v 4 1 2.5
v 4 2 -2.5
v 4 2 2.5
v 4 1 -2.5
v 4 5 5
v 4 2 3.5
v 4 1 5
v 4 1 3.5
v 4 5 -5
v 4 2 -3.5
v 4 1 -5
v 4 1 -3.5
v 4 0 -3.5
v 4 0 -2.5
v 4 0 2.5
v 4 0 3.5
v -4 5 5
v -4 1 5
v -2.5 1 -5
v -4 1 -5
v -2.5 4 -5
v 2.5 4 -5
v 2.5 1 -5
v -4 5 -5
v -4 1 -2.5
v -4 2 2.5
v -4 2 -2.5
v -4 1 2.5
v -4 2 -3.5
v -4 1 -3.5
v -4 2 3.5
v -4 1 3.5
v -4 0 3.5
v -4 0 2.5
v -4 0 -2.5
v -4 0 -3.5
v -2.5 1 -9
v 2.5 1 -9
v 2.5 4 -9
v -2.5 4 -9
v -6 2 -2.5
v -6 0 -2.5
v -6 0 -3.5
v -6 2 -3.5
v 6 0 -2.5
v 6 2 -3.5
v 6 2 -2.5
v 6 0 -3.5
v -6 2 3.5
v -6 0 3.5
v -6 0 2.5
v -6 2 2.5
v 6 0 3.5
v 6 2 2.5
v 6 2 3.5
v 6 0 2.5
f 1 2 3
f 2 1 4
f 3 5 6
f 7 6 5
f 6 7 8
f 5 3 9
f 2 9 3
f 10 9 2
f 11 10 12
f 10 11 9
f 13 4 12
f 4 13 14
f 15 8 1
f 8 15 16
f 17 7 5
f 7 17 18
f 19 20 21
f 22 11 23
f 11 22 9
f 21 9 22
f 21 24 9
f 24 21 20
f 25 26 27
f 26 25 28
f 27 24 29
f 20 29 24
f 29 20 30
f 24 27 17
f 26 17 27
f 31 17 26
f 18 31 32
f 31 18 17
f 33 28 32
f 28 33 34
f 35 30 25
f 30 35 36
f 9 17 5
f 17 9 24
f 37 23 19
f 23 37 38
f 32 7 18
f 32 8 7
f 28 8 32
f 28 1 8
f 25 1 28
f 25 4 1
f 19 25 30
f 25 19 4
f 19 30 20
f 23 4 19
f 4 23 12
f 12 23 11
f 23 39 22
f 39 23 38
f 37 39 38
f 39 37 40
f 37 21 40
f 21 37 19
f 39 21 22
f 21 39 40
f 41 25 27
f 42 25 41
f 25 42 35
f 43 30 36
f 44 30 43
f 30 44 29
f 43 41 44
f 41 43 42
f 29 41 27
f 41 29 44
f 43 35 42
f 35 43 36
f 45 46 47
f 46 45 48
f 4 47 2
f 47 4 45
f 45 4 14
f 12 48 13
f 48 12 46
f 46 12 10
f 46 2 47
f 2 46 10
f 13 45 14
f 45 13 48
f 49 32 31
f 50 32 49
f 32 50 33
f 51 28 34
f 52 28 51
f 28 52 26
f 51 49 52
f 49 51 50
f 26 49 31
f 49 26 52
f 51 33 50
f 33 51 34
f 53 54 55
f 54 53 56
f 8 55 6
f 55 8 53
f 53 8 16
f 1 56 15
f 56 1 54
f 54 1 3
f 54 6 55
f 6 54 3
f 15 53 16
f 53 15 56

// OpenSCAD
// file: lib.scad
// Voxcraft box-model library (OpenSCAD).
//
// Conventions: 1 unit = 1 texture pixel = 1/16 block. Origin = entity feet centre. +Y up,
// the model faces -Z (forward). Pivots are in model space.
//
// vx_bone() and vx_box() both produce geometry (so the model can be previewed/rendered and its
// geometry validated) AND echo a machine-readable record that tools/scad_export.py turns into
// the runtime box model. The .scad files are the single editable source of truth.

// Declare a bone: name, parent ("" = root), pivot point the bone rotates around.
module vx_bone(name, parent, pivot) {
    echo("VXBONE", name, parent, pivot);
    %translate(pivot) sphere(0.5, $fn = 6);   // preview-only marker
}

// A textured box attached to a bone. tex: texture for all faces; front: texture for the -Z face.
module vx_box(bone, min, size, tex, front = "") {
    echo("VXBOX", bone, min, size, tex, front == "" ? tex : front);
    translate(min) cube(size);
}
// main file
// Rockmite: a small armoured cave critter that swarms intruders. Original Voxcraft creature.
include <lib.scad>

vx_bone("body", "", [0, 3, 0]);
vx_bone("head", "body", [0, 3, -5]);
vx_bone("leg_fl", "body", [-4, 2, -3]);
vx_bone("leg_fr", "body", [ 4, 2, -3]);
vx_bone("leg_bl", "body", [-4, 2,  3]);
vx_bone("leg_br", "body", [ 4, 2,  3]);

vx_box("body", [-4, 1, -5], [8, 4, 10], "rockmite_shell");
vx_box("head", [-2.5, 1, -9], [5, 3, 4], "rockmite_shell", "rockmite_face");
vx_box("leg_fl", [-6, 0, -3.5], [2, 2, 1], "rockmite_leg");
vx_box("leg_fr", [ 4, 0, -3.5], [2, 2, 1], "rockmite_leg");
vx_box("leg_bl", [-6, 0,  2.5], [2, 2, 1], "rockmite_leg");
vx_box("leg_br", [ 4, 0,  2.5], [2, 2, 1], "rockmite_leg");
